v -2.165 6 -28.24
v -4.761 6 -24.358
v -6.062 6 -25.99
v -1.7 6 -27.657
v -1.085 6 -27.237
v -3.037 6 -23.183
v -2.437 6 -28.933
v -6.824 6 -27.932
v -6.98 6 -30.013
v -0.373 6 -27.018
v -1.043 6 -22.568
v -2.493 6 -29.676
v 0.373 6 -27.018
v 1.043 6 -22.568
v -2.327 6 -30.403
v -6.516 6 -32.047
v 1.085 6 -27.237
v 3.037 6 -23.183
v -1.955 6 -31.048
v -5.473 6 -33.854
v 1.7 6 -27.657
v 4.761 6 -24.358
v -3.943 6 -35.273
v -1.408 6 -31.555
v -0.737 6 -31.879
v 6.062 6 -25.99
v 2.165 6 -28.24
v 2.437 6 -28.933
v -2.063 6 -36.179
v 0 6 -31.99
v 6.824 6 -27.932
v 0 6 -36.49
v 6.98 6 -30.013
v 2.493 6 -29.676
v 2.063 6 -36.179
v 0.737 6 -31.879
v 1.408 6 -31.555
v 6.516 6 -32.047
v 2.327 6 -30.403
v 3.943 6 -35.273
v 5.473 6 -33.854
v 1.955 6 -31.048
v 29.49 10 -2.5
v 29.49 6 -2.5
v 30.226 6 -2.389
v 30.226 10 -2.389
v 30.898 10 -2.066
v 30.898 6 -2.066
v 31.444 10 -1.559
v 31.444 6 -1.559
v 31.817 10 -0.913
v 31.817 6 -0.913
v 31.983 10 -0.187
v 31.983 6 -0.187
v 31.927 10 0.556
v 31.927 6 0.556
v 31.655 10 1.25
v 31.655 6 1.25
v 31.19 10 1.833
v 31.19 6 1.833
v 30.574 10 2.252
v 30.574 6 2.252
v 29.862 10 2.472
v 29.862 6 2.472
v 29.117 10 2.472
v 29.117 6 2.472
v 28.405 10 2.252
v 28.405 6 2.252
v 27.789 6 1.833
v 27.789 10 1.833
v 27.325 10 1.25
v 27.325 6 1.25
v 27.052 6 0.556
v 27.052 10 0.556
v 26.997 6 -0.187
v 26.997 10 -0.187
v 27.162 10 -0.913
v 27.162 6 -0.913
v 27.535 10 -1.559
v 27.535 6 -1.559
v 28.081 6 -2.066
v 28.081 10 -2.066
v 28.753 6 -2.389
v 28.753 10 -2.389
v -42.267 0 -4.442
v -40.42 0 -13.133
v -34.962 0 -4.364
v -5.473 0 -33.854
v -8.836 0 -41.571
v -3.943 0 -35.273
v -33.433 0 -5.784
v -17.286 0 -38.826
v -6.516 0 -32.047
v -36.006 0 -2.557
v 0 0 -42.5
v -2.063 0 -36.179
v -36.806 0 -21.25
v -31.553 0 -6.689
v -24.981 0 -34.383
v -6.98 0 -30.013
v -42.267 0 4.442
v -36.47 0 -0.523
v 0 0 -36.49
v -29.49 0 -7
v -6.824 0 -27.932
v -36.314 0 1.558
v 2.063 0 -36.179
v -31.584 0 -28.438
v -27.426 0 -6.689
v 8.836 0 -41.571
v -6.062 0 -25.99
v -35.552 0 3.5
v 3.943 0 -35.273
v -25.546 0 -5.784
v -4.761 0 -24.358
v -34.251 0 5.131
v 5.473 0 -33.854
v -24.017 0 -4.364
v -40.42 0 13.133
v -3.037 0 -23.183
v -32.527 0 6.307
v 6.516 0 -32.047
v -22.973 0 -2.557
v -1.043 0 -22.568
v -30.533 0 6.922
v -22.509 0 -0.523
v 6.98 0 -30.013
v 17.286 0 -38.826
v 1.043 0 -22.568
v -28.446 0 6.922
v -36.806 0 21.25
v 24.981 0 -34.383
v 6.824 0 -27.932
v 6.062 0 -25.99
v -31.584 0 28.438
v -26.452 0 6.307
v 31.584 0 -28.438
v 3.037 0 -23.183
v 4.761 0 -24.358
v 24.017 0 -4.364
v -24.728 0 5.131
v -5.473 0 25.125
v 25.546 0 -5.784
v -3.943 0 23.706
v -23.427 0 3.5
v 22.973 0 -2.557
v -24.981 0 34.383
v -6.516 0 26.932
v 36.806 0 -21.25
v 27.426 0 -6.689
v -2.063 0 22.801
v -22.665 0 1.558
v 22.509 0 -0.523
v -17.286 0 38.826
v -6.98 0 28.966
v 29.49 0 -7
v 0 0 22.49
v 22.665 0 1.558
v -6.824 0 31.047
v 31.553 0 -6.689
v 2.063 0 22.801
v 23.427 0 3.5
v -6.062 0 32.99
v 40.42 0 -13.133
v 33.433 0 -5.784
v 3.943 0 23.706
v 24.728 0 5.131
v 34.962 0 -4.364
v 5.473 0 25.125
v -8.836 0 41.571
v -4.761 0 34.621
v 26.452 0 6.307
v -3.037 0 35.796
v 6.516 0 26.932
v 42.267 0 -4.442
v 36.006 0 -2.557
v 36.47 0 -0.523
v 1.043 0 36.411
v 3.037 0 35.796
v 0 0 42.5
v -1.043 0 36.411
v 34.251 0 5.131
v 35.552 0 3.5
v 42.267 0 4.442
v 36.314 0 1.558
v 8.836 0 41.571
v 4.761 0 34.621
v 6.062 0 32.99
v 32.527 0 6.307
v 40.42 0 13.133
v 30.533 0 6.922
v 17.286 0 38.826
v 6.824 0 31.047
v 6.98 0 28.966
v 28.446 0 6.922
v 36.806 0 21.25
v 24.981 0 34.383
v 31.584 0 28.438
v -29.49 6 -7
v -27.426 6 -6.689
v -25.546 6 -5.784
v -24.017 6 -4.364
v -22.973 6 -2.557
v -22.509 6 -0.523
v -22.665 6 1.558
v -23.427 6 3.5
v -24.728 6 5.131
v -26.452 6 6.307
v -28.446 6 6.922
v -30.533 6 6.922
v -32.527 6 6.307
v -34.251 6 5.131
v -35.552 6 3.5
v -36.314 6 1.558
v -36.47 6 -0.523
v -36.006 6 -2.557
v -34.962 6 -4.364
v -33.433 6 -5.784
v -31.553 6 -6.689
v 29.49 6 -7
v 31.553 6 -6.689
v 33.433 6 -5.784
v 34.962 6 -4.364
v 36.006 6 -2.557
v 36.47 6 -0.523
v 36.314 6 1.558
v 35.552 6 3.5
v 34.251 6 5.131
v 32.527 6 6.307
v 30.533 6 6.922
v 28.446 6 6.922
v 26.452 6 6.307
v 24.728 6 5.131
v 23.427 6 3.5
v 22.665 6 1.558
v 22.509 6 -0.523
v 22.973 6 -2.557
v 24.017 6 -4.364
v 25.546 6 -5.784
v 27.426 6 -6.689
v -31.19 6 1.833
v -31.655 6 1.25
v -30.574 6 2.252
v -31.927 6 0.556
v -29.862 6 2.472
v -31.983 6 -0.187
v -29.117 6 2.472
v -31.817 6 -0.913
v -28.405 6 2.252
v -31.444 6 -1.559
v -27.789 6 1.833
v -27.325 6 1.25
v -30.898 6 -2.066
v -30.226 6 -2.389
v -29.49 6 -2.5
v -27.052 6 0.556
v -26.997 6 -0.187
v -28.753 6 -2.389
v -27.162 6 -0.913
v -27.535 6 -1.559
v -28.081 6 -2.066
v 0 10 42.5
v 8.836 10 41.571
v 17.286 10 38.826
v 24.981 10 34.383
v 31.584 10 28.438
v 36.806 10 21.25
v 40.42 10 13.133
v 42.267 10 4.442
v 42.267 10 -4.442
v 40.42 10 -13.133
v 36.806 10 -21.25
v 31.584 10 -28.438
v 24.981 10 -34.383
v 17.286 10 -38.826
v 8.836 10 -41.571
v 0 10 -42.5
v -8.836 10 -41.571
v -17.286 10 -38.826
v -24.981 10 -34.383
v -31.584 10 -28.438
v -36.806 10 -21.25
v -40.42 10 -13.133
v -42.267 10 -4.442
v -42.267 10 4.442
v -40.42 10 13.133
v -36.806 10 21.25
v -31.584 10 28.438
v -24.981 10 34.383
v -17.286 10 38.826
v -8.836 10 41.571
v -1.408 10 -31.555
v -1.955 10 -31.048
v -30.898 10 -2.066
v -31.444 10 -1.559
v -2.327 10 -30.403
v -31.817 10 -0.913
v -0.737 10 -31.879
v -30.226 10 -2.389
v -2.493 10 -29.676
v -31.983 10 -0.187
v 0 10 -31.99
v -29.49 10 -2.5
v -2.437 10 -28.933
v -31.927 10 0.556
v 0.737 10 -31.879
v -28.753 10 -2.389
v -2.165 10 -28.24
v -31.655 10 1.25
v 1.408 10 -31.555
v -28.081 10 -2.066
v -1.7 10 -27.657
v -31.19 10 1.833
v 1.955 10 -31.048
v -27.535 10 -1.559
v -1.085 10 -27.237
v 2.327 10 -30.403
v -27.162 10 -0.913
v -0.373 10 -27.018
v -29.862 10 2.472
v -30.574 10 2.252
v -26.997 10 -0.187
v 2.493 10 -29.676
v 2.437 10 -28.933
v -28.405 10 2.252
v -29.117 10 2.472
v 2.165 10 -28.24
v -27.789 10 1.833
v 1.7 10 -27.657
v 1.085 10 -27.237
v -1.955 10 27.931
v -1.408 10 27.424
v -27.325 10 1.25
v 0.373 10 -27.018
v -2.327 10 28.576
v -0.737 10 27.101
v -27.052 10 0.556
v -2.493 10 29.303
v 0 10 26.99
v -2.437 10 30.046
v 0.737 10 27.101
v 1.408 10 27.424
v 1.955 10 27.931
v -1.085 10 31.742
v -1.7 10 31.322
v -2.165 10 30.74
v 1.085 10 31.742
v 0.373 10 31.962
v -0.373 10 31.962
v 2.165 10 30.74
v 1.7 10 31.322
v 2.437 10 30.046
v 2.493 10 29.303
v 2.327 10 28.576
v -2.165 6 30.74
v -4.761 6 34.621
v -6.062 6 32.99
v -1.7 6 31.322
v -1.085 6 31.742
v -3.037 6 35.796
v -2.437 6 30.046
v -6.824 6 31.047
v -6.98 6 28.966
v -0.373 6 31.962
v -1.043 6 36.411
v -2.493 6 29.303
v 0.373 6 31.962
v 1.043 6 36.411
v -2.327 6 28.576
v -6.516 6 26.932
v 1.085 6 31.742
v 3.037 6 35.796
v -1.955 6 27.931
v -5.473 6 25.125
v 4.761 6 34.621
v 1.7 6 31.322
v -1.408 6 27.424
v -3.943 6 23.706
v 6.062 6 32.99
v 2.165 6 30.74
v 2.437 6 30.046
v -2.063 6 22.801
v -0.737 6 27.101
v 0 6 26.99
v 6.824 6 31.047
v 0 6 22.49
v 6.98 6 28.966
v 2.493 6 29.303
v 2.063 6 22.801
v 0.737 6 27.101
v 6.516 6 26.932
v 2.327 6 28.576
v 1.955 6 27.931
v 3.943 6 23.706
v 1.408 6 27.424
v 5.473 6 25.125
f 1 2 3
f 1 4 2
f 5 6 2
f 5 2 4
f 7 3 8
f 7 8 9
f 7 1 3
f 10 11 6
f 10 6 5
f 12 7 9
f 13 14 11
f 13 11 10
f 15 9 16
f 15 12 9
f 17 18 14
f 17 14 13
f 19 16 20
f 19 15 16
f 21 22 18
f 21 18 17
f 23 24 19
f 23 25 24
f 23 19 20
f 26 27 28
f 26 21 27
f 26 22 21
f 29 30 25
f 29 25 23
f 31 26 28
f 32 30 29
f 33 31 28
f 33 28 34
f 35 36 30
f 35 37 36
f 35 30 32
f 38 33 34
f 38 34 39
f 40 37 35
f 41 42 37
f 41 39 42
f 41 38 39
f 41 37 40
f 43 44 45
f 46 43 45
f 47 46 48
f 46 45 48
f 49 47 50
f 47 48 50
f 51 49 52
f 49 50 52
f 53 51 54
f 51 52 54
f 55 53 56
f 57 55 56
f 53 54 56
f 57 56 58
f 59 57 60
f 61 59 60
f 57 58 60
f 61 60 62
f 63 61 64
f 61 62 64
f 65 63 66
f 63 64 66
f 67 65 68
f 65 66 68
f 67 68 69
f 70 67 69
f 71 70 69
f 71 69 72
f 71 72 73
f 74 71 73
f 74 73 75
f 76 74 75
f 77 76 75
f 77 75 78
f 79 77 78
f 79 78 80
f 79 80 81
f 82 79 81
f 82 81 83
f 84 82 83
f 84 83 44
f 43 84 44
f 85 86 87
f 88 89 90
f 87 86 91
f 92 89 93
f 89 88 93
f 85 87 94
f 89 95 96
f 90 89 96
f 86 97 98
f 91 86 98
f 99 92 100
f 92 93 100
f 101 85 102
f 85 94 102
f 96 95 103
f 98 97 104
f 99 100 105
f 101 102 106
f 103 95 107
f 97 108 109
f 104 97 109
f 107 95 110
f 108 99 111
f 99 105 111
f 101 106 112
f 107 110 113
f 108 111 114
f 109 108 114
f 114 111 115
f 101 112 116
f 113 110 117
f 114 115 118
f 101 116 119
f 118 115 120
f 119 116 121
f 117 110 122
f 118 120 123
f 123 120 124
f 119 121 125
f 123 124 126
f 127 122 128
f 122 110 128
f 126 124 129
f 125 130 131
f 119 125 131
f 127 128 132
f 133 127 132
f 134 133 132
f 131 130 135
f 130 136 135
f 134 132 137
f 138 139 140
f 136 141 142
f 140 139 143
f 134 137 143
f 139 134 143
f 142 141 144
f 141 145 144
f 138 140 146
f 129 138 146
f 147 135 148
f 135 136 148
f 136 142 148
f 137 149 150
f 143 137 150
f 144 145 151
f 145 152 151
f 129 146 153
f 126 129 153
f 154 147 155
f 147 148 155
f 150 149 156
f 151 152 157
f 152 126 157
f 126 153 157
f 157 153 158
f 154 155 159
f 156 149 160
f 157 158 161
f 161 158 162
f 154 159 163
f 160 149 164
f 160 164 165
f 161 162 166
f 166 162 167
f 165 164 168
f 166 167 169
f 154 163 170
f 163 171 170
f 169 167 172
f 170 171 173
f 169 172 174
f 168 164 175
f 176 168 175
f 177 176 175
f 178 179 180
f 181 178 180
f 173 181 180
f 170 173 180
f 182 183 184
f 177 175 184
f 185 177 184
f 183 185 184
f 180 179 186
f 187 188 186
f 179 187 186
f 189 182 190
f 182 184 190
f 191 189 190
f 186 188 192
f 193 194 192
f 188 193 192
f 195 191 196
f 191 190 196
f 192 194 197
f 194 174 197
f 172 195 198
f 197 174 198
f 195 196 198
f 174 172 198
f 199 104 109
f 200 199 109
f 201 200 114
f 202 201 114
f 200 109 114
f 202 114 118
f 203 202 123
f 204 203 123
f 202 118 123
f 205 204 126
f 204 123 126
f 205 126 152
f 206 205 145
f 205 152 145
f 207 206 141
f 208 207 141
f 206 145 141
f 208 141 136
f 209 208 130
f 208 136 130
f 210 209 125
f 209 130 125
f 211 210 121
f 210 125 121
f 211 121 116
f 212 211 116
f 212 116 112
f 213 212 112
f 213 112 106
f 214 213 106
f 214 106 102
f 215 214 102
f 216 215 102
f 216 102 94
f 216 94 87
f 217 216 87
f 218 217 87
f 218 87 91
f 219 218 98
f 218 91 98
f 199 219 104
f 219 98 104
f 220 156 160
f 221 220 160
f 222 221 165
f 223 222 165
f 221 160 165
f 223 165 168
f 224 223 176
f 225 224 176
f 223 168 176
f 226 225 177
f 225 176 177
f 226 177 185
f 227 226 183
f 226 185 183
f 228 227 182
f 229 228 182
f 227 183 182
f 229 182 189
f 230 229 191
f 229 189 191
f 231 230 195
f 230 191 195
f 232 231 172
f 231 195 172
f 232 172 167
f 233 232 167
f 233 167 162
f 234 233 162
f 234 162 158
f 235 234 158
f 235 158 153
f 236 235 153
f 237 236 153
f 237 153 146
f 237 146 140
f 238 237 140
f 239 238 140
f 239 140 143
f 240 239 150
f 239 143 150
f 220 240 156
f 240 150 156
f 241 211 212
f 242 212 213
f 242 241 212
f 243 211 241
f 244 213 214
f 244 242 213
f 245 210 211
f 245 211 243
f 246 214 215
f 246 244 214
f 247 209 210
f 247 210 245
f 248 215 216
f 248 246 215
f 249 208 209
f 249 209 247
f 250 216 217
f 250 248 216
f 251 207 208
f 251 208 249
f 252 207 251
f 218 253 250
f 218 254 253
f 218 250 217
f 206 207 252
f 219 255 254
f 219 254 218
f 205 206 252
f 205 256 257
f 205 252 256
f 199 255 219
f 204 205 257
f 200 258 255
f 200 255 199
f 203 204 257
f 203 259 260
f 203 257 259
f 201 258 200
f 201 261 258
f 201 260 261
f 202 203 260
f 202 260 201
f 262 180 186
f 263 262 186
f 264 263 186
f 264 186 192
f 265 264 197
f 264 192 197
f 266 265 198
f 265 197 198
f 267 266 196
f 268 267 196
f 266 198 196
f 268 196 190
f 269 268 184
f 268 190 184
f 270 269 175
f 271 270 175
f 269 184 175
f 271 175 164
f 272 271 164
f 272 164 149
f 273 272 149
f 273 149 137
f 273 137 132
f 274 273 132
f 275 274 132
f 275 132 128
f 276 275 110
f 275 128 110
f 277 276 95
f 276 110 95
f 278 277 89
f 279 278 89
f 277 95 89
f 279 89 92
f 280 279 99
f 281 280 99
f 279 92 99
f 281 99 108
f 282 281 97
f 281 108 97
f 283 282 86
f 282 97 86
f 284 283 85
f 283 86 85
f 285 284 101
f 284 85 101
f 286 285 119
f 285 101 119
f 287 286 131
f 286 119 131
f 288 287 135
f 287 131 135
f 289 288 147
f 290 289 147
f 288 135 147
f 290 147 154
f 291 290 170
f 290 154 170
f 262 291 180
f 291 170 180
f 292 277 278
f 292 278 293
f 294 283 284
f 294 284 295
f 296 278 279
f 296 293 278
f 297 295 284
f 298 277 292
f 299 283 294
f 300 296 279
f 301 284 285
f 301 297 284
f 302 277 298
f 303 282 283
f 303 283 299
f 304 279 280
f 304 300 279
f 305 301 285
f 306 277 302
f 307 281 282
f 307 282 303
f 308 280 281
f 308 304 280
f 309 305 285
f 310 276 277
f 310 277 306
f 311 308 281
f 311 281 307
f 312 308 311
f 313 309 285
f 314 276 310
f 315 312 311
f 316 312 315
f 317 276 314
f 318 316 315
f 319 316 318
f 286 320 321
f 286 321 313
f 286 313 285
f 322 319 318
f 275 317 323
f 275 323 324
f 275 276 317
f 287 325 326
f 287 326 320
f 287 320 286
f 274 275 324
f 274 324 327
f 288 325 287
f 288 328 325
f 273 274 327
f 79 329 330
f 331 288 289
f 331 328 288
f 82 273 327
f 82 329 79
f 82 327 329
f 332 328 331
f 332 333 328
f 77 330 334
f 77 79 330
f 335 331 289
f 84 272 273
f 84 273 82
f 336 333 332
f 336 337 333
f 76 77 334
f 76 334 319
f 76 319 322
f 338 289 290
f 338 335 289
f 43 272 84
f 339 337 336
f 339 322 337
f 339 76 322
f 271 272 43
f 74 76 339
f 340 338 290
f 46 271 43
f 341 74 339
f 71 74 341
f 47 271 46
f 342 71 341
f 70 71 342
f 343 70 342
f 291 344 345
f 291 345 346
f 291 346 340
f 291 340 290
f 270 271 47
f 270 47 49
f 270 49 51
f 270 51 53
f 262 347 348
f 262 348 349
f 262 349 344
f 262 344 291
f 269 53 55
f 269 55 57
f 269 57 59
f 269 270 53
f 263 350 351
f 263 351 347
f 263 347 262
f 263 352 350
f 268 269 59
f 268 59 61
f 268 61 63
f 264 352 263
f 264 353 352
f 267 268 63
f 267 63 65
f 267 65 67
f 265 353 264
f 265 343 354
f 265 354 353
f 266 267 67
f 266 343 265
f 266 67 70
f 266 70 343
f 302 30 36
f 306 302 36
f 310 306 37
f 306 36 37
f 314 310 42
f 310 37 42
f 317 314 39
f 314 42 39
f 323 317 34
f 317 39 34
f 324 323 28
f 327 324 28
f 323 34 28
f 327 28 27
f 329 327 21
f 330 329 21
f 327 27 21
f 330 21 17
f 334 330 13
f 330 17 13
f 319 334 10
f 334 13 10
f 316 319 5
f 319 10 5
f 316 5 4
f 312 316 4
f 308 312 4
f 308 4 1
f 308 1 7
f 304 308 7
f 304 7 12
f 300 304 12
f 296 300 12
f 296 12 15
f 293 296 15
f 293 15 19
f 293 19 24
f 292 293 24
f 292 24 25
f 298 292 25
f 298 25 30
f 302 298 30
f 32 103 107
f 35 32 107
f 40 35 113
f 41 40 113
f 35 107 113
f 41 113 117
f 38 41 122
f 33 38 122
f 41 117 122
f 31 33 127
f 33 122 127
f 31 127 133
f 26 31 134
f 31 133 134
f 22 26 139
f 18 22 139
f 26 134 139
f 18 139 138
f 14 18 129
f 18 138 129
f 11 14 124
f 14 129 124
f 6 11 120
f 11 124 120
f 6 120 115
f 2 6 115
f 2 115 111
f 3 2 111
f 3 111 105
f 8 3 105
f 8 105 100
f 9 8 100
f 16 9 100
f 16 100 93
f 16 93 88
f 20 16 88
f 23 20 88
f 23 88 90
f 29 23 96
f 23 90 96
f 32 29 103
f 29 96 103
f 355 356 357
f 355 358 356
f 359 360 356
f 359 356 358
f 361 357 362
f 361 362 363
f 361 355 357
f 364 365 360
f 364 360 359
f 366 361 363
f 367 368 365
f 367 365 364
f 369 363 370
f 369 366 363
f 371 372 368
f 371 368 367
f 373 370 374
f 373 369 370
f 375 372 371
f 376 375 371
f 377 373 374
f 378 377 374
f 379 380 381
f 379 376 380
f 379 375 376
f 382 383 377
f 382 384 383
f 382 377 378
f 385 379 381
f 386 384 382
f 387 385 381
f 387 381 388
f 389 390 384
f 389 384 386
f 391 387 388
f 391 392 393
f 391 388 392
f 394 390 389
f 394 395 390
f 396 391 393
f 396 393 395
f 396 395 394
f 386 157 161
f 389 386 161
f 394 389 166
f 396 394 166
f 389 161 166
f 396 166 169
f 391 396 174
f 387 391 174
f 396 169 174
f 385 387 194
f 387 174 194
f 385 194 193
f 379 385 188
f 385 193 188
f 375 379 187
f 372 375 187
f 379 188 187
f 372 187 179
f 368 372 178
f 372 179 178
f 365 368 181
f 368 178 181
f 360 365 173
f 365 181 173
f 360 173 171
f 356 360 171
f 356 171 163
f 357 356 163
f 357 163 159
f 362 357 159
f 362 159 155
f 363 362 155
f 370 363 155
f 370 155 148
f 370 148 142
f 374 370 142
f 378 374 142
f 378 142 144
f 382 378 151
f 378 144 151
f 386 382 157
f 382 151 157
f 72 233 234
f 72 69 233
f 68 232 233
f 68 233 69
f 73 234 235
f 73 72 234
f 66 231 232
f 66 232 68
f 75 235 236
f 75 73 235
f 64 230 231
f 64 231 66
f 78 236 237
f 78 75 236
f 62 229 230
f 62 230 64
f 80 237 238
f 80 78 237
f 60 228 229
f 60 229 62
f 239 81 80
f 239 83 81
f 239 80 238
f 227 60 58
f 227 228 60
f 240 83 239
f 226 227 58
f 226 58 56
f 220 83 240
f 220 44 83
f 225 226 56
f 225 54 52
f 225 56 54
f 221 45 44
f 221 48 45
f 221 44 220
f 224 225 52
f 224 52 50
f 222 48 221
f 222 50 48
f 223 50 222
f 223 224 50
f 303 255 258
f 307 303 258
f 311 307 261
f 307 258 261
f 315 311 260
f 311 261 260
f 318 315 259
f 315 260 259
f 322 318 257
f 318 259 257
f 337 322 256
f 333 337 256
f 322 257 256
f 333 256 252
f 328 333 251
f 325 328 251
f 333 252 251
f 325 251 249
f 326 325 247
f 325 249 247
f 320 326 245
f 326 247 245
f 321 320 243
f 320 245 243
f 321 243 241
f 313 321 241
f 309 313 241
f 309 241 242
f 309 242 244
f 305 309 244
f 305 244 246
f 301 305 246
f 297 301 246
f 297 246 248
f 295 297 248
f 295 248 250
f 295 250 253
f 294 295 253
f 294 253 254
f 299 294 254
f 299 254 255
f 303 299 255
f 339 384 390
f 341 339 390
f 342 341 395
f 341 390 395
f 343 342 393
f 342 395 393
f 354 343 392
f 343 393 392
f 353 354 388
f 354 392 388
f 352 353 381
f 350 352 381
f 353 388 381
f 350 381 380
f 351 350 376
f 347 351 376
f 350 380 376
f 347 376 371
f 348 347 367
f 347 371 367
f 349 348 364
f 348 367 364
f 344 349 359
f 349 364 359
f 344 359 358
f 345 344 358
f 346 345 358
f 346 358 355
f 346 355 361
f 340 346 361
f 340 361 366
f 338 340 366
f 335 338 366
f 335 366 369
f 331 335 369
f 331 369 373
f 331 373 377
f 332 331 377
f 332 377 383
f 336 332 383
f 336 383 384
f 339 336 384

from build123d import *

# Parameters (mm, degrees)
SKETCH_1_R          = 42.5
EXTRUDE_1_DEPTH     = 10
SKETCH_2_R          = 7
CUT_EXTRUDE_1_DEPTH = 6
SKETCH_3_R          = 2.5
CUT_EXTRUDE_2_DEPTH = 6


with BuildPart() as part:
    # Эскиз1 → Вытянуть1 (new body)
    with BuildSketch(Plane(origin=(0, 0, 0), x_dir=(1, 0, 0), z_dir=(0, 1, 0))):
        with Locations(Location((0, 0, 0), (0, 0, 270))):
            Circle(SKETCH_1_R)
    extrude(amount=EXTRUDE_1_DEPTH)

    # Эскиз2 → Вырез-Вытянуть1 (cut)
    with BuildSketch(Plane.XZ):
        with Locations(Location((-29.48960133, 0, 0), (0, 0, 270))):
            Circle(SKETCH_2_R)
        with Locations(Location((0, 29.48960133, 0), (0, 0, 270))):
            Circle(SKETCH_2_R)
        with Locations(Location((29.48960133, 0, 0), (0, 0, 270))):
            Circle(SKETCH_2_R)
        with Locations(Location((0, -29.48960133, 0), (0, 0, 270))):
            Circle(SKETCH_2_R)
    extrude(amount=-CUT_EXTRUDE_1_DEPTH, mode=Mode.SUBTRACT)

    # Эскиз3 → Вырез-Вытянуть2 (cut)
    with BuildSketch(Plane.XZ.offset(-6)):
        with Locations(Location((-29.48960133, 0, 0), (0, 0, 270))):
            Circle(SKETCH_3_R)
        with Locations(Location((0, 29.48960133, 0), (0, 0, 270))):
            Circle(SKETCH_3_R)
        with Locations(Location((29.48960133, 0, 0), (0, 0, 270))):
            Circle(SKETCH_3_R)
        with Locations(Location((0, -29.48960133, 0), (0, 0, 270))):
            Circle(SKETCH_3_R)
    extrude(amount=-CUT_EXTRUDE_2_DEPTH, mode=Mode.SUBTRACT)


solid = part.part
